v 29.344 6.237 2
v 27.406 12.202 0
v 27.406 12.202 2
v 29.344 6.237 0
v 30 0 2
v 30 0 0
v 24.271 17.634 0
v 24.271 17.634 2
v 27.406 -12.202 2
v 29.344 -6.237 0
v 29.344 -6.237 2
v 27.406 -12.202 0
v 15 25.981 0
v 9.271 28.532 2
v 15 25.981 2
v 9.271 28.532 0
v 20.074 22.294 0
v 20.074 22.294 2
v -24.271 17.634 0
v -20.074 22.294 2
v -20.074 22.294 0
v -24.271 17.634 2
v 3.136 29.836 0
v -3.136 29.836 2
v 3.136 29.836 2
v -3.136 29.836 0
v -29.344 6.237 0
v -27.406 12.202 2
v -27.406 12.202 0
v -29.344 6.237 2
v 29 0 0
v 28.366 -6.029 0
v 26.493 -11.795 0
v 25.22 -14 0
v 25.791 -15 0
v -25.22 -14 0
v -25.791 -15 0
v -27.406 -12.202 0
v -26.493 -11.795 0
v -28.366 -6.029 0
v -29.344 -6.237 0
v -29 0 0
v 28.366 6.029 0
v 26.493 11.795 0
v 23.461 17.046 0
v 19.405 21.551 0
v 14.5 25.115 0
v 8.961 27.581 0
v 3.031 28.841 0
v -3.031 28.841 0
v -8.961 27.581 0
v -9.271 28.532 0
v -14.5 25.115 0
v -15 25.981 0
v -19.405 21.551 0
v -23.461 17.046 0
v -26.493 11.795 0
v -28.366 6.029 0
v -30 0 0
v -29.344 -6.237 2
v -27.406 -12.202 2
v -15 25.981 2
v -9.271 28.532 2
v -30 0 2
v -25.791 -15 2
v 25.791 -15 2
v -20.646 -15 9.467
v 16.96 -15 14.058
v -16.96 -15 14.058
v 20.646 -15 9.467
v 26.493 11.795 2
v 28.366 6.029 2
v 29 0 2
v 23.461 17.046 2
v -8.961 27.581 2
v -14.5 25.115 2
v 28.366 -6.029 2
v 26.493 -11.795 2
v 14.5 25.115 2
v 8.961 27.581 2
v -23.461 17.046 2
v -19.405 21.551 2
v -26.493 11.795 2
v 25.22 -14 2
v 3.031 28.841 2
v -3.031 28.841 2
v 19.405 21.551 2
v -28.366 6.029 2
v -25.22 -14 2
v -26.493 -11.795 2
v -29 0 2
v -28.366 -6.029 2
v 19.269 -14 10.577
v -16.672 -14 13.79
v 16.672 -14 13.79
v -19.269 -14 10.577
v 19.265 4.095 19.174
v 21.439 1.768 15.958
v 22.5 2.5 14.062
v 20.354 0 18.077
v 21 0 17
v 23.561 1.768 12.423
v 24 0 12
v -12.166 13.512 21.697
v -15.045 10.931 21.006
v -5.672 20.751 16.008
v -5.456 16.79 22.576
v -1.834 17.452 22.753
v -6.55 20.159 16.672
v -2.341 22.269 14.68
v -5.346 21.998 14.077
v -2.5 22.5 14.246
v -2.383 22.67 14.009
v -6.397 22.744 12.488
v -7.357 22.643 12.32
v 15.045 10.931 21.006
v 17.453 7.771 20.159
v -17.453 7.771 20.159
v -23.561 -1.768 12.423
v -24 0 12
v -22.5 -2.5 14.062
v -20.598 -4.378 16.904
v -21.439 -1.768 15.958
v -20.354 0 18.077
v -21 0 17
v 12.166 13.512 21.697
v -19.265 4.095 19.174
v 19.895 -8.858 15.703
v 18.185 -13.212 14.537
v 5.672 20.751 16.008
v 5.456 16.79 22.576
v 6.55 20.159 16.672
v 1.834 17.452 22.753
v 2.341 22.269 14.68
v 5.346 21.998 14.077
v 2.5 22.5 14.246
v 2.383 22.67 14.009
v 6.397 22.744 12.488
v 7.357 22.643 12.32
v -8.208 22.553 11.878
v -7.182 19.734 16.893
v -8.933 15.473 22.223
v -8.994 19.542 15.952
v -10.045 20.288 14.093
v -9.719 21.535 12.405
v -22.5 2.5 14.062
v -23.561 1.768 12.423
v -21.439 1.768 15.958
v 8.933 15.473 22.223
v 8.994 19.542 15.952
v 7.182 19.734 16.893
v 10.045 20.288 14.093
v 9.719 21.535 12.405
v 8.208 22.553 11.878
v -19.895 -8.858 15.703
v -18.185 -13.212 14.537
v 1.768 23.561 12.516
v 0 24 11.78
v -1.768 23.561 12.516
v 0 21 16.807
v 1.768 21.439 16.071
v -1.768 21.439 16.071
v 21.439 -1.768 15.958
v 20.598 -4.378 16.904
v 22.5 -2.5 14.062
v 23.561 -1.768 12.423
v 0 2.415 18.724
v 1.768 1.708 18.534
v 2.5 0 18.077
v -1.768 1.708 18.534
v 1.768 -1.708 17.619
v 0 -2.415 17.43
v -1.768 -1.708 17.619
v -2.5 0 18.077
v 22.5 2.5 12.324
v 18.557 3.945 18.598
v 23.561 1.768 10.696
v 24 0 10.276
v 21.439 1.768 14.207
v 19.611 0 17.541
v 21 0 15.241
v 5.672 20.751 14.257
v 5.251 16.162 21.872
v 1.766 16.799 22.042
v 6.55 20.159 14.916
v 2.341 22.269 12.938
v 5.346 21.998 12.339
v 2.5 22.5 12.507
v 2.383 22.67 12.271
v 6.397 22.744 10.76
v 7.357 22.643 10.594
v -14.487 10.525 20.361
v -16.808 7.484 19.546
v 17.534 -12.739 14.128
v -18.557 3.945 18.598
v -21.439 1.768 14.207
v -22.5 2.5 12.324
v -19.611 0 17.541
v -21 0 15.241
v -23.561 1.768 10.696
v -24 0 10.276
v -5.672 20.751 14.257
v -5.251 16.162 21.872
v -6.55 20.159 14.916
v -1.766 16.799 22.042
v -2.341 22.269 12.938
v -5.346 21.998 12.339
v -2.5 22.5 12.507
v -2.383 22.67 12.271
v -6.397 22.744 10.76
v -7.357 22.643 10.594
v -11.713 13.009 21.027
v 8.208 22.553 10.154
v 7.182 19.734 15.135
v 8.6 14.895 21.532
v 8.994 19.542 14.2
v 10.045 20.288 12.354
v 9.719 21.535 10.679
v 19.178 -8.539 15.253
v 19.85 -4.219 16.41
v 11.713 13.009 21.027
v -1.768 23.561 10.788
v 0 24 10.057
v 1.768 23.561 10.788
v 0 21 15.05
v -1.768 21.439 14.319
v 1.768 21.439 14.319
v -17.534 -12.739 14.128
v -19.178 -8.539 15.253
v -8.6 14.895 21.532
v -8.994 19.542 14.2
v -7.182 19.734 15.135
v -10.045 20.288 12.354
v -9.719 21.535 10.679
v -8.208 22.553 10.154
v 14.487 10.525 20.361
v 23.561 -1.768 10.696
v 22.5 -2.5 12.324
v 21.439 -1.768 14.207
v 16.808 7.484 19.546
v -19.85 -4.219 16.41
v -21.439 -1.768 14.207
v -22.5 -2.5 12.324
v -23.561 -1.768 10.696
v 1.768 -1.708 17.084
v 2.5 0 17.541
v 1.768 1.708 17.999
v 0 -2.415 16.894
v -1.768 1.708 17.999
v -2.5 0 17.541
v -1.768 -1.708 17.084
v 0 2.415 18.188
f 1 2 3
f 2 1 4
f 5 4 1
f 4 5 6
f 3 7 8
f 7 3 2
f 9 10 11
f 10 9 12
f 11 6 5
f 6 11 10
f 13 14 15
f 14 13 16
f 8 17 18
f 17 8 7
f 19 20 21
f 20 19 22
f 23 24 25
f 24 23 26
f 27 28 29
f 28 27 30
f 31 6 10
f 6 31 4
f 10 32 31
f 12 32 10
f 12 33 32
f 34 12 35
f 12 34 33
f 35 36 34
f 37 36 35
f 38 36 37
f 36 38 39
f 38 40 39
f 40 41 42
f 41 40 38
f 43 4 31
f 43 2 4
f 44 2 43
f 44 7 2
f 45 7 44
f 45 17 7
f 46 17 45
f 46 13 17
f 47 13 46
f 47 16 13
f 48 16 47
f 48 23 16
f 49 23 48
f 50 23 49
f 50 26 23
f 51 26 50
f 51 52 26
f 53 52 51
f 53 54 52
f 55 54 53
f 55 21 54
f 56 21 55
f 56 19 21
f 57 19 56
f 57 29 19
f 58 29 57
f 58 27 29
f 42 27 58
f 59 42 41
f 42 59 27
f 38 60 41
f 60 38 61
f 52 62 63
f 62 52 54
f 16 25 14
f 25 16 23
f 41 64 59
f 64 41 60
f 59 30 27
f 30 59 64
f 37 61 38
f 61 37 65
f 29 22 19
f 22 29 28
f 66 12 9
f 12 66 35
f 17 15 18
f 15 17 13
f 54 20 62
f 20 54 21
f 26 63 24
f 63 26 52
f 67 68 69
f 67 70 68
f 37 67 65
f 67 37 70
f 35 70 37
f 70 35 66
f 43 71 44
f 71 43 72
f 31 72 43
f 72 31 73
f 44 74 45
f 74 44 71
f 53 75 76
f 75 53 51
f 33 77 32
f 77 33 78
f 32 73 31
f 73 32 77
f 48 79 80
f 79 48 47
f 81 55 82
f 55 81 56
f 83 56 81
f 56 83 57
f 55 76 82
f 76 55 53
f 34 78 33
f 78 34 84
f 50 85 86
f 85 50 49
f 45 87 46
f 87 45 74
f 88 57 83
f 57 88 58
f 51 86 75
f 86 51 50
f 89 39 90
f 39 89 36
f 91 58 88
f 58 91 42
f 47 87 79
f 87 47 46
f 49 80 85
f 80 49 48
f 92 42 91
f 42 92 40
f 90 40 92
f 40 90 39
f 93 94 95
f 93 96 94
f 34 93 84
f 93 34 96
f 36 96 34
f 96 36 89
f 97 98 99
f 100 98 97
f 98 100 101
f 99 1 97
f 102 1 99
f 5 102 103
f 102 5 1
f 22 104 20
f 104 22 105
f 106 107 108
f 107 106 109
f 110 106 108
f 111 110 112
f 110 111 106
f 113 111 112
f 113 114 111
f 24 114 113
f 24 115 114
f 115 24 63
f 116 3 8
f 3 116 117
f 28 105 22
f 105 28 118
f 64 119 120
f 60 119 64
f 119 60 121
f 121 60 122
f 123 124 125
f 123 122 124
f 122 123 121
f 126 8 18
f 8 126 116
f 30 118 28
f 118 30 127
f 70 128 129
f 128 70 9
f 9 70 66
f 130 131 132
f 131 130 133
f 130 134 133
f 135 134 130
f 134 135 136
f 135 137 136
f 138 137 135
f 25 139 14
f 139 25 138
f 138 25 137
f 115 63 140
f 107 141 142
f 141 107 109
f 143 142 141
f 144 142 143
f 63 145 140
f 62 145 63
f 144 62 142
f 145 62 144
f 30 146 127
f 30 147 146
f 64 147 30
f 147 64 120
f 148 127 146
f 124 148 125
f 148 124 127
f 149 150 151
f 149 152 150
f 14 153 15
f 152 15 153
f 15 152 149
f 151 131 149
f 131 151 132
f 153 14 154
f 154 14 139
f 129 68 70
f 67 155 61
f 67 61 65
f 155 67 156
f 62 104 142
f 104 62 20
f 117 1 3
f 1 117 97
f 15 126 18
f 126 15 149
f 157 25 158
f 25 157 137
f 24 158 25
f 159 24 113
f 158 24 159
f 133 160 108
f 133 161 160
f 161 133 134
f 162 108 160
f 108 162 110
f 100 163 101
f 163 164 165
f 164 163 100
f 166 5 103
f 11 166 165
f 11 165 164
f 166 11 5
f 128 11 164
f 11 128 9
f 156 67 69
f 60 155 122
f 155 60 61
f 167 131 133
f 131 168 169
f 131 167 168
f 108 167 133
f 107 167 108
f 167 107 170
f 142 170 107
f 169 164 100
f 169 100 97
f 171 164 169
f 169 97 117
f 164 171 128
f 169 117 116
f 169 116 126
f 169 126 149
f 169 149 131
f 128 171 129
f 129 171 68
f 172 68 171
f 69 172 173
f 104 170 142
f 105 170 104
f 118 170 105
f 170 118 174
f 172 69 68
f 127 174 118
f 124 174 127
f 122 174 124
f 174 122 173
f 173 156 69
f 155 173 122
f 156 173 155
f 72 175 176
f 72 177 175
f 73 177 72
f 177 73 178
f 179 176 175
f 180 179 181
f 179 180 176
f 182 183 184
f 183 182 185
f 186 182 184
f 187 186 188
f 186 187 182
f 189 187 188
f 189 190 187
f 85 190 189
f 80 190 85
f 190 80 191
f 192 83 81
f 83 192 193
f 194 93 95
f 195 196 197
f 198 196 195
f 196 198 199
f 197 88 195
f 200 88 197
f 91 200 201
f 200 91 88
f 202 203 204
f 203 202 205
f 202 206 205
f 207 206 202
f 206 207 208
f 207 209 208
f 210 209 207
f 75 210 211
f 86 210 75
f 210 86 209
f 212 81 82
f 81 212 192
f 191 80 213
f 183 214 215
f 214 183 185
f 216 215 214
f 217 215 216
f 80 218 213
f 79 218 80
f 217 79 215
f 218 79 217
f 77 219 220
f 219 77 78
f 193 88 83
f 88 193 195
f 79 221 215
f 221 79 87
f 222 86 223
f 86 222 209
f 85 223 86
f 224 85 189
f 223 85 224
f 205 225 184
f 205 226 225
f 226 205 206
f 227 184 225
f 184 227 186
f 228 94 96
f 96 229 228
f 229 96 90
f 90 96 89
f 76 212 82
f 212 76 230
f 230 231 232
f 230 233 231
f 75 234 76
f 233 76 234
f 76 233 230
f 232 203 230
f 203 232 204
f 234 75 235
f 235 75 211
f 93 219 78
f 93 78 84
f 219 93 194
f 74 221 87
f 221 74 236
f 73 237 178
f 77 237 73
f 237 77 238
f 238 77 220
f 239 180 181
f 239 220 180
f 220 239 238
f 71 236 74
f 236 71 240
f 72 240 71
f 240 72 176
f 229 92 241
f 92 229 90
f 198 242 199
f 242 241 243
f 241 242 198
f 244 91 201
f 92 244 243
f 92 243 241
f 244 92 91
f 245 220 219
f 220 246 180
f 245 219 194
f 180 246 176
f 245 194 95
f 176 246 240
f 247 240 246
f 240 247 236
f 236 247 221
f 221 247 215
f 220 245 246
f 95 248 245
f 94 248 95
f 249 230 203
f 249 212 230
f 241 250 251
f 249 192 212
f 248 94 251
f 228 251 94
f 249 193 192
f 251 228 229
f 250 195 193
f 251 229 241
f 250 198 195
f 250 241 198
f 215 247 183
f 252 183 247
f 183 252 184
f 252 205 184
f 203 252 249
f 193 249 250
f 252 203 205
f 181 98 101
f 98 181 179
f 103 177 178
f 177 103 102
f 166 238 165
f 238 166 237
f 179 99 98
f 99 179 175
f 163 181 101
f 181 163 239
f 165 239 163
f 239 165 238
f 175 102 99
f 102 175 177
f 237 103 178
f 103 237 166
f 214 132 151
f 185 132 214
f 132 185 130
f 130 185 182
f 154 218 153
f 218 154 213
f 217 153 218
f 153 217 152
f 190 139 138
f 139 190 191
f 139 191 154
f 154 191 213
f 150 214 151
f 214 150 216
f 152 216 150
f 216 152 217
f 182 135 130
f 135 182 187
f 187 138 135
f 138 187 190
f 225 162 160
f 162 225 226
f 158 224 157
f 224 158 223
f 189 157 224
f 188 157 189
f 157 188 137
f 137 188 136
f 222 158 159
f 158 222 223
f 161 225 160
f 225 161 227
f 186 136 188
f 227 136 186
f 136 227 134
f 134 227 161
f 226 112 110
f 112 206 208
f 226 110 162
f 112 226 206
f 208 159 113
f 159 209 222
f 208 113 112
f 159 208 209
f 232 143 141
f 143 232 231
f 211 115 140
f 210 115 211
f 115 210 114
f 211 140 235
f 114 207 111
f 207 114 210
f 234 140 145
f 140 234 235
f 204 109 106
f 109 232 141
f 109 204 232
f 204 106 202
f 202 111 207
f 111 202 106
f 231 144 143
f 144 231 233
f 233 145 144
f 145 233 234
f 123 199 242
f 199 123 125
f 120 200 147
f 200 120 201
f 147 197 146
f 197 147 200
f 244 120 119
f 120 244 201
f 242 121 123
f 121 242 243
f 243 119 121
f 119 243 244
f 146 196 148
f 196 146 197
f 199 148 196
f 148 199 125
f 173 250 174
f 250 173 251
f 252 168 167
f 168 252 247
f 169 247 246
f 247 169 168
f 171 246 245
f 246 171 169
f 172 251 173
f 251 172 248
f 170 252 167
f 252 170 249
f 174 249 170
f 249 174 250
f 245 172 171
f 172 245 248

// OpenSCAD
// Diameter at the bottom
ldia = 60; // [30:90]
// Maximum height
ht = 25; // [15:50]
// Defines the slope of the code 
cone_ht = 50; // [25:150]
// Angle of slope for top cut
back_slope = 15; // [0:45]
// Skin thickness
thickness = 2;  // [1:10]
// Platform on which the code rests
platform_ht = 2;  // [0:10]


module led_hole(slope, disp) {
    //rotate([0,0,-45]) 
    translate([0,disp, 0]) scale([1, slope, 1]) cylinder(d=5, h=2*ht);
}

module solid_shell(d, h) {
    difference () {
        cylinder(r1 = d/2, r2 = 0, h = h);
        translate([-d, -d, 0])
            rotate([back_slope,0,0])
                cube([2*d, 2*d, 4*d]);
        translate([-d/2, -d-d/2+15, 0])
            cube([d,d,4*d]);        
    }
}

module top_shell() {
    difference () {
        solid_shell(ldia, cone_ht);
        solid_shell(ldia-thickness, cone_ht-thickness);
        for (angle = [-90,-20,0,20,90])
            rotate([0,0,angle]) 
                led_hole(ldia/2/cone_ht, 3/8*ldia);
        led_hole(cos(back_slope), 0);
    }
}

module solid_platform(d, h) {
    difference () {
       cylinder(r = d/2, h = h);
        translate([-d/2, -d-d/2+15, 0])
            cube([d,d,4*d]);        
    } 
}

module platform() {
    difference () {
        solid_platform(ldia, platform_ht);
        solid_platform(ldia-thickness, platform_ht);
    }
}

union () {
    platform();
    translate([0,0, platform_ht]) top_shell();
}
